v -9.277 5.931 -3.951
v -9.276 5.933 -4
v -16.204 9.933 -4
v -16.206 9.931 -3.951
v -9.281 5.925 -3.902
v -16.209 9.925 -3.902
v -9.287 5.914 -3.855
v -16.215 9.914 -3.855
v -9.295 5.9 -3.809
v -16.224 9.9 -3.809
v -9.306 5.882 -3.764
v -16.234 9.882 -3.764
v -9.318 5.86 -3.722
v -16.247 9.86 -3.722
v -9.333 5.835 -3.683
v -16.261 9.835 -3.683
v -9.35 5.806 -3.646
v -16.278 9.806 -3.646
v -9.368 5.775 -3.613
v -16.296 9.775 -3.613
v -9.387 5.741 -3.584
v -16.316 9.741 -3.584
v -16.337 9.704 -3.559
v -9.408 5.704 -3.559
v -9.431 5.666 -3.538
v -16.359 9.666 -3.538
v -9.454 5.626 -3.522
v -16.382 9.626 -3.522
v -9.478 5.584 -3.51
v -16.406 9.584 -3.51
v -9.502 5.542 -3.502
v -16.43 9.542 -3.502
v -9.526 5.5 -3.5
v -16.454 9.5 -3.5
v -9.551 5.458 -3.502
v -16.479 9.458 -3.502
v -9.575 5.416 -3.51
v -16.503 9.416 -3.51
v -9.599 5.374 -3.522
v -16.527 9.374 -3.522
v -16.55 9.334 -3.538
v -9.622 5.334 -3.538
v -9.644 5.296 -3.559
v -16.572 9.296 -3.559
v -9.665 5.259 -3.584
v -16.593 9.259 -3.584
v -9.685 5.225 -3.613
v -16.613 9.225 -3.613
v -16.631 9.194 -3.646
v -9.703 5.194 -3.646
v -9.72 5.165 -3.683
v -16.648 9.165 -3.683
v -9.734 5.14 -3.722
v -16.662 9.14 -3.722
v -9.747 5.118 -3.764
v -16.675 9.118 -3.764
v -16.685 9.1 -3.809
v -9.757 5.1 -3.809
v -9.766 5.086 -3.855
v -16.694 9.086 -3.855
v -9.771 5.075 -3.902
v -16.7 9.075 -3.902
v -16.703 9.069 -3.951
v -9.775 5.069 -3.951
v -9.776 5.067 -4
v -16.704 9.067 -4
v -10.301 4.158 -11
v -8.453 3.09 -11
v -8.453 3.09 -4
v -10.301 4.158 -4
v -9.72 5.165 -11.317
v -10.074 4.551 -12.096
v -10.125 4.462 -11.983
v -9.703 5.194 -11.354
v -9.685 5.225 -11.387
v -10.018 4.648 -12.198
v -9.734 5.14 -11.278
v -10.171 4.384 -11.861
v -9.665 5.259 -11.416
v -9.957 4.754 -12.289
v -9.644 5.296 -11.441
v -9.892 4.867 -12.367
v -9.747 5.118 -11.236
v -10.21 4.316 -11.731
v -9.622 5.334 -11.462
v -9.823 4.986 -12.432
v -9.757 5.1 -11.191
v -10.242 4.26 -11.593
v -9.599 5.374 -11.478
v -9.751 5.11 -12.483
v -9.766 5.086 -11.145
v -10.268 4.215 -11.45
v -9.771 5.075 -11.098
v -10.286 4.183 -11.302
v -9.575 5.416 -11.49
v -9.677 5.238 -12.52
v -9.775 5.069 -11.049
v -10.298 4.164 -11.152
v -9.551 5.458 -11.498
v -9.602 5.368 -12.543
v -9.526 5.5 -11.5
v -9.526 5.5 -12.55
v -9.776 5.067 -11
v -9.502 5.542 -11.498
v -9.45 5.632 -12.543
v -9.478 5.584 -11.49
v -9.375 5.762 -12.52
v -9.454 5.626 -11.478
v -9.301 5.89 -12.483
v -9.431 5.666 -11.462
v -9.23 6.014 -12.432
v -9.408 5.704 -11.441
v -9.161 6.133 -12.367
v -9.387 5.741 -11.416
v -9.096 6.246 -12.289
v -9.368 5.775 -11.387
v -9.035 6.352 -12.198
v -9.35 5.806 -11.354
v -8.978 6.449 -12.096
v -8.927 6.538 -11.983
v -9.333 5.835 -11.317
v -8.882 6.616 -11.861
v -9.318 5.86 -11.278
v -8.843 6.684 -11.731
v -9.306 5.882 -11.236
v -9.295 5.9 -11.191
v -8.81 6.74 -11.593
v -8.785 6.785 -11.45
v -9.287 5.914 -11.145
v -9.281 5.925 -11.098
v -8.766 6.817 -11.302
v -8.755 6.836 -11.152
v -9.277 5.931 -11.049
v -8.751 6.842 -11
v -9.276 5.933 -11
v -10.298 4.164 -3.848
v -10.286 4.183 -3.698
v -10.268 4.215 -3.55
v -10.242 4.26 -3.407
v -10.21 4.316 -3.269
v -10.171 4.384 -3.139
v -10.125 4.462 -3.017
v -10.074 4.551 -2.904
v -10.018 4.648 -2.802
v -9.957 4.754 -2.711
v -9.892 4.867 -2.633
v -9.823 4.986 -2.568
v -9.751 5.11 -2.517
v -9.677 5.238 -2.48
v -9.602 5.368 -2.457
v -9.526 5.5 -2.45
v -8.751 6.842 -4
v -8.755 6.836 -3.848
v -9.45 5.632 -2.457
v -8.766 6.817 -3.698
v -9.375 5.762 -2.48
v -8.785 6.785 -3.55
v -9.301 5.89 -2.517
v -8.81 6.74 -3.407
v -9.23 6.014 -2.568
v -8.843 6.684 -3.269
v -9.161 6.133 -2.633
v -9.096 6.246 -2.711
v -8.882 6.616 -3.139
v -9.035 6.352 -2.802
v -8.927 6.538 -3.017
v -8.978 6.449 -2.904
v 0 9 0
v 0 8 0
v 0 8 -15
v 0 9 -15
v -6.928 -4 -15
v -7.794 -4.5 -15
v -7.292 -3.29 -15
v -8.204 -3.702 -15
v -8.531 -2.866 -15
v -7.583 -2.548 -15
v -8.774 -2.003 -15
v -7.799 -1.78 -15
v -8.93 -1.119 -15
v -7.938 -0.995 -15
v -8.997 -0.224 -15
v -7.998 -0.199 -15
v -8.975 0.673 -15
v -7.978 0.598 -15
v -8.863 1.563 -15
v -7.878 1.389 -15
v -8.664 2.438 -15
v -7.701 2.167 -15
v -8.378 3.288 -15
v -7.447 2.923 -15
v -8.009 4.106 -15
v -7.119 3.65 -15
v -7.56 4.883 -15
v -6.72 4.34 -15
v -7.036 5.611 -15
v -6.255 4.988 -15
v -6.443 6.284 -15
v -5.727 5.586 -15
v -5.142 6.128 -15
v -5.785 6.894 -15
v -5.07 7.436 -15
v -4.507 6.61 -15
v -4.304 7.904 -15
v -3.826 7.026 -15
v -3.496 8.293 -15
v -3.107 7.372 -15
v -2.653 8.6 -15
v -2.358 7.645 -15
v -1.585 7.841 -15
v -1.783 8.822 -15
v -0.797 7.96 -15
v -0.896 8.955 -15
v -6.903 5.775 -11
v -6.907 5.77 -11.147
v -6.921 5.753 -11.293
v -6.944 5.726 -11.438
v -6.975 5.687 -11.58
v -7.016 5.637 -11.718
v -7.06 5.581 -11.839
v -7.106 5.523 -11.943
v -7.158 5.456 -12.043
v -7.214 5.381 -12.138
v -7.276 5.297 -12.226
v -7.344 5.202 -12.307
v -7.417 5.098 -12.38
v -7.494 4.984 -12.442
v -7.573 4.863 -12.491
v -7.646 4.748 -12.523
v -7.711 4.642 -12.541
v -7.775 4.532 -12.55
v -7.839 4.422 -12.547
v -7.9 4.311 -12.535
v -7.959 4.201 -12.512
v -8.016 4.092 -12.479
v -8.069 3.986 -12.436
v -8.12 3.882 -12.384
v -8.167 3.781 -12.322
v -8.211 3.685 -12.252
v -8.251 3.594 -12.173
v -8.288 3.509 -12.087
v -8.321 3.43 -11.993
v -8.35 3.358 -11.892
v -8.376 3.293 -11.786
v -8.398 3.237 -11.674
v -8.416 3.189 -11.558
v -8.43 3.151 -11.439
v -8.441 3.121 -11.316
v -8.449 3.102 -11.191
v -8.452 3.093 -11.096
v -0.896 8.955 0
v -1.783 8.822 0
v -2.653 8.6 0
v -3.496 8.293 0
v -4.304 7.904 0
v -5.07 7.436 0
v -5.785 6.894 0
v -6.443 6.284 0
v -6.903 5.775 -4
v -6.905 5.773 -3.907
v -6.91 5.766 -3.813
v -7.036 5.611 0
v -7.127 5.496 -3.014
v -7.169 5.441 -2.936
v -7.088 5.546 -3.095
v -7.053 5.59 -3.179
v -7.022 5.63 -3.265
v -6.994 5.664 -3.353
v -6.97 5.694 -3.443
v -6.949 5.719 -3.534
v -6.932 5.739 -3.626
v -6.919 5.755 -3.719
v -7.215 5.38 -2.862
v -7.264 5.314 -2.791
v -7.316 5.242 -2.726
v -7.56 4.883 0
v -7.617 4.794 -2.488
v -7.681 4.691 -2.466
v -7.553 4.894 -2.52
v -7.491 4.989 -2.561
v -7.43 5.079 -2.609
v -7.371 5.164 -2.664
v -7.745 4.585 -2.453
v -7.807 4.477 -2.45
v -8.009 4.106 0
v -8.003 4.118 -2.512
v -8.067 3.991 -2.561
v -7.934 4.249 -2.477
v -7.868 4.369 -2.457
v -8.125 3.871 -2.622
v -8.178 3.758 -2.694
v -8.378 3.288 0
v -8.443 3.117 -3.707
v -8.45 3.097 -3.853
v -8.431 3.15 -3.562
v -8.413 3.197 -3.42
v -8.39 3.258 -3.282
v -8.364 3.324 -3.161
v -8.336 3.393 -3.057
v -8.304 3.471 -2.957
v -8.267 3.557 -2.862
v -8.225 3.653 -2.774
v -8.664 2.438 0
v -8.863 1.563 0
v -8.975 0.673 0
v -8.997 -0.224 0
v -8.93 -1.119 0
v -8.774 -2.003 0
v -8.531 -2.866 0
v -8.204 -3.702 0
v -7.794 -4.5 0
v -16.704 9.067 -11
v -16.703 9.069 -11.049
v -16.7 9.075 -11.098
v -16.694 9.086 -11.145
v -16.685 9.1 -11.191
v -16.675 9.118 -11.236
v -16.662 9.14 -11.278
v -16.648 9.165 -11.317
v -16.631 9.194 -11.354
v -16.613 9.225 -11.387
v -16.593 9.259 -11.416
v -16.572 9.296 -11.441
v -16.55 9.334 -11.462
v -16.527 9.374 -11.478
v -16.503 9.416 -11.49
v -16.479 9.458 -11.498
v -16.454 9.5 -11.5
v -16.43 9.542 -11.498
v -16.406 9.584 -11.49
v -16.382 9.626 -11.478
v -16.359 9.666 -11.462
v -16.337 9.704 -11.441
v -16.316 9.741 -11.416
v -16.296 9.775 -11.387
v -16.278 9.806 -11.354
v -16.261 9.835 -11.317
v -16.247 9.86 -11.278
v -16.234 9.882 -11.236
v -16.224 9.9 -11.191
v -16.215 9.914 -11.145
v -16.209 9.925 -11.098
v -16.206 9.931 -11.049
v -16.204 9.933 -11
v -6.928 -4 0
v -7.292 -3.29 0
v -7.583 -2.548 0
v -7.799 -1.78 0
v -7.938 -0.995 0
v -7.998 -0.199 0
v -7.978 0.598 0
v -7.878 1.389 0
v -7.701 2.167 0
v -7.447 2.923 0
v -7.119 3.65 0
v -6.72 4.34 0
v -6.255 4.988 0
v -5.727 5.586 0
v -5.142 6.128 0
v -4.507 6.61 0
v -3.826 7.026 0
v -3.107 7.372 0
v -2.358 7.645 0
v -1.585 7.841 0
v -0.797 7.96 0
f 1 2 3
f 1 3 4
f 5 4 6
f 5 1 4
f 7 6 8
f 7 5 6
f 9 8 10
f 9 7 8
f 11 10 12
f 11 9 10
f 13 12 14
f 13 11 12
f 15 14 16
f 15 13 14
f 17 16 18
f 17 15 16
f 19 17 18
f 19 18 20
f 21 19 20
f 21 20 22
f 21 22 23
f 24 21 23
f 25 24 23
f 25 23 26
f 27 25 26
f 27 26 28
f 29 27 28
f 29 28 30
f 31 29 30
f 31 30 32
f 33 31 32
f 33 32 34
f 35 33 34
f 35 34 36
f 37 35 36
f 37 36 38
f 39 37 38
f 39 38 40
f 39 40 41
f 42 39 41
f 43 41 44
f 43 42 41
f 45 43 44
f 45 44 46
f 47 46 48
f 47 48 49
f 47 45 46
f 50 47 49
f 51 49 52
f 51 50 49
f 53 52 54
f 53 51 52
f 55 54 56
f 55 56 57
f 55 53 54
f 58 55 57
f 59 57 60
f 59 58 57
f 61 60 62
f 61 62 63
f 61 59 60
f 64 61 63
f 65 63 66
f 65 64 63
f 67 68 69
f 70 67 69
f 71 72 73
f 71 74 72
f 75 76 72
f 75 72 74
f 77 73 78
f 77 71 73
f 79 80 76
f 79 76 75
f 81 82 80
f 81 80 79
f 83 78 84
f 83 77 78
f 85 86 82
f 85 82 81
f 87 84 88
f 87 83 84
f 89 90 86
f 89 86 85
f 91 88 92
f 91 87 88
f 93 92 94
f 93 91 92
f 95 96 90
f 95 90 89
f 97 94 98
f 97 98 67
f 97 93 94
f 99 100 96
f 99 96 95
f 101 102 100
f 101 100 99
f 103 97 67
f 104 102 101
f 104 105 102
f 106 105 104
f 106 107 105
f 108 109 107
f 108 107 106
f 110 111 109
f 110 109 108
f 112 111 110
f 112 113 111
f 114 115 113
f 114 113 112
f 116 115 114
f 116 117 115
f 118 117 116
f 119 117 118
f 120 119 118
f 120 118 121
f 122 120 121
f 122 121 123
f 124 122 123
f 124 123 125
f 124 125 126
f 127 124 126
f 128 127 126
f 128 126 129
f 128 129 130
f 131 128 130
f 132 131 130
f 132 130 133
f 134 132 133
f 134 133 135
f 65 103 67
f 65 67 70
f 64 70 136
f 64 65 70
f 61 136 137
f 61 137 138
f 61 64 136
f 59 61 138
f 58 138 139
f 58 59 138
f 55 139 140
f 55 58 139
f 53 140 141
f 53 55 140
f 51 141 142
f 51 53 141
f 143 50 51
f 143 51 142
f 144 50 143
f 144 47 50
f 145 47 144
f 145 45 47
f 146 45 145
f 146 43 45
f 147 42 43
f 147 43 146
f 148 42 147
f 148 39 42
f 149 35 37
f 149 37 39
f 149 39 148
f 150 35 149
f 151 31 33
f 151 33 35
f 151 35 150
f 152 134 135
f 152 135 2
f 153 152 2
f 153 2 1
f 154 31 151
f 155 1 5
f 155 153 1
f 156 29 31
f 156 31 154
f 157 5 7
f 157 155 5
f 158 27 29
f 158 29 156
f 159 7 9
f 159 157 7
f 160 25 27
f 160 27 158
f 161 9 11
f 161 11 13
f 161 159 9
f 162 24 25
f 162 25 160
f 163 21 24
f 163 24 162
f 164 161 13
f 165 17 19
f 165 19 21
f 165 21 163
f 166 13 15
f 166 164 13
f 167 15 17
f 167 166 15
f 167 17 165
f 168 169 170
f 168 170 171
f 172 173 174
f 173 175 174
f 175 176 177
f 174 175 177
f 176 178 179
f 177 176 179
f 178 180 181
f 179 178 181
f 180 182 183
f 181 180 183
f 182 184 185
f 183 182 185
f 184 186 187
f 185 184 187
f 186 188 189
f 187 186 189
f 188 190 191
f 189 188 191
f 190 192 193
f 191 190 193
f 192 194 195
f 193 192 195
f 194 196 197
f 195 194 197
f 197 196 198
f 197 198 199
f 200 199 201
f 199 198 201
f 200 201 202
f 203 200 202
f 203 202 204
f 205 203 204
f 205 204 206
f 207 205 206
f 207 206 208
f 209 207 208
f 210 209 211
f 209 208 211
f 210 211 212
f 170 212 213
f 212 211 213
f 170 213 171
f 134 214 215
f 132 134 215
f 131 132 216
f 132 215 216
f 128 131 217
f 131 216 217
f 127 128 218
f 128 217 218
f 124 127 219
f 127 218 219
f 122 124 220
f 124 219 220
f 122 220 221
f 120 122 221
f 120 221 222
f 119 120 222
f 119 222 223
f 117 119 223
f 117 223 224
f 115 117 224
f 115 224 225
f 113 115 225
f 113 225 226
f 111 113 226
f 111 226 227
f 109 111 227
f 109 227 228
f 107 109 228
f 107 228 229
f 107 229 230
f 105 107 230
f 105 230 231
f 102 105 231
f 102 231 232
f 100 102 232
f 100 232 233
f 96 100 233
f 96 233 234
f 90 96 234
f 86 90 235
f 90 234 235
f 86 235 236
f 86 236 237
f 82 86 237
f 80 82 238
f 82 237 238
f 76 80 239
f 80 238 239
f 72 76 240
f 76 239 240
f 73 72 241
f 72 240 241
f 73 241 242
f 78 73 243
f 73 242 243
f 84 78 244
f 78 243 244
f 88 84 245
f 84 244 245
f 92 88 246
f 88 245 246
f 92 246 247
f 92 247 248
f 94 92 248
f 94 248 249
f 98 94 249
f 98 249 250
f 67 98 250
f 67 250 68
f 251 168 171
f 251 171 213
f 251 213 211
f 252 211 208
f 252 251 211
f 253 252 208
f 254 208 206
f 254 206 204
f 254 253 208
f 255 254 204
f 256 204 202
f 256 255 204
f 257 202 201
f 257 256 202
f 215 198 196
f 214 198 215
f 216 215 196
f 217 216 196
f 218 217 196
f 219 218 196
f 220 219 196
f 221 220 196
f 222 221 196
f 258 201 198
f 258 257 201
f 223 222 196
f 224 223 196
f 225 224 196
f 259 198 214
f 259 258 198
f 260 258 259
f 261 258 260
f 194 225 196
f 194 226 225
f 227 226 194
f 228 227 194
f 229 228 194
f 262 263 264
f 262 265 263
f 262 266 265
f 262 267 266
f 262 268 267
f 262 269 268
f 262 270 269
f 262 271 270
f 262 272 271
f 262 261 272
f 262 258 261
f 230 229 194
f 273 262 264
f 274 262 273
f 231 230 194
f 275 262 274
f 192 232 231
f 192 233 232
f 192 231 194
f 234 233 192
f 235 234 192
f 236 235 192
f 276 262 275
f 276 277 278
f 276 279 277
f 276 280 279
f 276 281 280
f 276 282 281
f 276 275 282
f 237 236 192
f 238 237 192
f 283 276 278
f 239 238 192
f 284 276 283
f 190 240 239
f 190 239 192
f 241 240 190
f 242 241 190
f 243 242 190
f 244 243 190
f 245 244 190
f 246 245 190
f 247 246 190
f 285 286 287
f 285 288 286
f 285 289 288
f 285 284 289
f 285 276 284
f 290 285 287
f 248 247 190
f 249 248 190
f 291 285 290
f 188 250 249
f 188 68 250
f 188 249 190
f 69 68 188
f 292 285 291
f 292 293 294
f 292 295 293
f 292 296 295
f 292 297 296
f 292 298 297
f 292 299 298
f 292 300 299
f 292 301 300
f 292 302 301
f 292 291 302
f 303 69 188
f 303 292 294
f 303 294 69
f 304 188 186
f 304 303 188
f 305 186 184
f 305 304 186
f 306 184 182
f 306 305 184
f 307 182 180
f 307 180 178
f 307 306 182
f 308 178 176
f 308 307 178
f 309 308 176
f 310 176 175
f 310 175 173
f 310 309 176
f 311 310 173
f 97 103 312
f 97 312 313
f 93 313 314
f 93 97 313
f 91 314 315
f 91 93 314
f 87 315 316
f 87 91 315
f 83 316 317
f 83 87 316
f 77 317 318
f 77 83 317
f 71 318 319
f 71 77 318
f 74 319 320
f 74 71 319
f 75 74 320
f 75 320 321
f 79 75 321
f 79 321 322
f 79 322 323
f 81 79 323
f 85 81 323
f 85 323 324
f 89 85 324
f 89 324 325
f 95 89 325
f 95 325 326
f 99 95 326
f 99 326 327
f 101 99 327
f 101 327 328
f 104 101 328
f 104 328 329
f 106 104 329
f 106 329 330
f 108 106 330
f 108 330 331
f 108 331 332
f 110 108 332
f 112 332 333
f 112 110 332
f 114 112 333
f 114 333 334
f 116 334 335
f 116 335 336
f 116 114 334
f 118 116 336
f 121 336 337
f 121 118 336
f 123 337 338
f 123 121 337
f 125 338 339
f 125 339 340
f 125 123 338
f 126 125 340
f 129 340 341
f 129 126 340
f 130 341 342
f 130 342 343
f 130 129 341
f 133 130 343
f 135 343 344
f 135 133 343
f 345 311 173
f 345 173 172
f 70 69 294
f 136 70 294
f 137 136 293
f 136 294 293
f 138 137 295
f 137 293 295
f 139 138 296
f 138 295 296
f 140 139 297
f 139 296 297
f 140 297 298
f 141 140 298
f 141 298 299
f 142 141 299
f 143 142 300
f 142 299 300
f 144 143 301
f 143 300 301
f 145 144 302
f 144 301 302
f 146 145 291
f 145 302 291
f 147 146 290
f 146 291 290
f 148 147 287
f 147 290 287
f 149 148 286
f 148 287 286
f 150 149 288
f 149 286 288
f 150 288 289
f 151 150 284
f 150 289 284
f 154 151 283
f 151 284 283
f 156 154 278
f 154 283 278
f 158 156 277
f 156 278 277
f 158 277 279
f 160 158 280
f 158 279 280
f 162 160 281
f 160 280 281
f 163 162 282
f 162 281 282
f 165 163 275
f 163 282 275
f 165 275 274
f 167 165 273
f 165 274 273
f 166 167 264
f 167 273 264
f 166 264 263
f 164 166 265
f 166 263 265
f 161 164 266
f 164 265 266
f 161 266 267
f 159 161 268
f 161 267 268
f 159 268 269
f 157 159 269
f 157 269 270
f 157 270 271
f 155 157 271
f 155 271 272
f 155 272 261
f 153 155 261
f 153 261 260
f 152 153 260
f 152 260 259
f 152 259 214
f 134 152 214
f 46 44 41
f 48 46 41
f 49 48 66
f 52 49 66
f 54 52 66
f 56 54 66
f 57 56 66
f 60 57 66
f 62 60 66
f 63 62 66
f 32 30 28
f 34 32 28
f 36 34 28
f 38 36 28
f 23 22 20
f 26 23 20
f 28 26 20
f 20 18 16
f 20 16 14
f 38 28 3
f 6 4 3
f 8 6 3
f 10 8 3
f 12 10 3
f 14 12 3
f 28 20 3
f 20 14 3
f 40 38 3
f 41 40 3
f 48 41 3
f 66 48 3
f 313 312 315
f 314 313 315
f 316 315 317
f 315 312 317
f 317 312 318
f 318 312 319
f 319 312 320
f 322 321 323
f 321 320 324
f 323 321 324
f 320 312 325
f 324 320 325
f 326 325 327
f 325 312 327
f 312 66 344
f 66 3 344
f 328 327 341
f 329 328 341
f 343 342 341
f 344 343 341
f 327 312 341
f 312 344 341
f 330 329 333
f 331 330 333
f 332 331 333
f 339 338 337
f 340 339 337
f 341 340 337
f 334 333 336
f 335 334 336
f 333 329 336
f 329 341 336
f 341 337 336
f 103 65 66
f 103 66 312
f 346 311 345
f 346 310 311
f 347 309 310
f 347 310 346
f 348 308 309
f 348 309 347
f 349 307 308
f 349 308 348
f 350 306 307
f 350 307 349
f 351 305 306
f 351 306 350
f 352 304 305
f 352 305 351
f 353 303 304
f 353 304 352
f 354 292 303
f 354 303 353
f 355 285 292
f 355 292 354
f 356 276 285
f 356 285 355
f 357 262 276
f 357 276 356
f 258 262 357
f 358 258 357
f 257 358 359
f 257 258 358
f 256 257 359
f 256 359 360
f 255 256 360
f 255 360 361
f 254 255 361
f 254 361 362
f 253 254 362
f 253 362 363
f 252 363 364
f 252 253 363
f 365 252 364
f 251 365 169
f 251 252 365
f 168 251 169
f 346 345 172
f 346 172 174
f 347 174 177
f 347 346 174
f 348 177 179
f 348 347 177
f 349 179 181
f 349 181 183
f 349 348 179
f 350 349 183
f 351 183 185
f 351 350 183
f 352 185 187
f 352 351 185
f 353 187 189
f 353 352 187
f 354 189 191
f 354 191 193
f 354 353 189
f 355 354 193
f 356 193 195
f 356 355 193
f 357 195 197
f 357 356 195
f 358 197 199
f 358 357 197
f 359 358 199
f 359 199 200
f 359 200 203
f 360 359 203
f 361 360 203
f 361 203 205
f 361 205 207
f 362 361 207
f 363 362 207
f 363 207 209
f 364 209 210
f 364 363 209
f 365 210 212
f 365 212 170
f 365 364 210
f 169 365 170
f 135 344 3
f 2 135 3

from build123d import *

# Parameters (mm, degrees)
BOSS_EXTRU_1_DEPTH = 15
BOSS_EXTRU_2_START = -0.0139
BOSS_EXTRU_2_DEPTH = 10.0139
BOSS_EXTRU_4_START = -0.134477
BOSS_EXTRU_4_DEPTH = 2.134477


with BuildPart() as part:
    # Esquisse1 → Boss.-Extru.1 (new body)
    with BuildSketch(Plane.XY):
        with BuildLine():
            Line((-7.794228634, -4.5), (-6.92820323, -4))
            ThreePointArc((-6.92820323, -4), (-6.92820323, 4), (0, 8))
            Line((0, 8), (0, 9))
            ThreePointArc((0, 9), (-7.794228634, 4.5), (-7.794228634, -4.5))
        make_face()
    extrude(amount=-BOSS_EXTRU_1_DEPTH)

    # Esquisse2 → Boss.-Extru.2 (add)
    with BuildSketch(Plane(origin=(-7.794228634, 4.5, 0), x_dir=(0, 0, 1), z_dir=(-0.866025404, 0.5, 0)).offset(BOSS_EXTRU_2_START)):
        with BuildLine():
            Line((-11, 0.5), (-4, 0.5))
            ThreePointArc((-4, 0.5), (-3.5, 0), (-4, -0.5))
            Line((-4, -0.5), (-11, -0.5))
            ThreePointArc((-11, -0.5), (-11.5, 0), (-11, 0.5))
        make_face()
    extrude(amount=BOSS_EXTRU_2_DEPTH)

    # Esquisse7 → Boss.-Extru.4 (add)
    with BuildSketch(Plane(origin=(-7.794228634, 4.5, 0), x_dir=(0, 0, 1), z_dir=(-0.866025404, 0.5, 0)).offset(BOSS_EXTRU_4_START)):
        with BuildLine():
            Line((-4, 1.55), (-11, 1.55))
            ThreePointArc((-11, 1.55), (-12.55, 0), (-11, -1.55))
            Line((-11, -1.55), (-4, -1.55))
            ThreePointArc((-4, -1.55), (-2.45, 0), (-4, 1.55))
        make_face()
    extrude(amount=BOSS_EXTRU_4_DEPTH)


solid = part.part
